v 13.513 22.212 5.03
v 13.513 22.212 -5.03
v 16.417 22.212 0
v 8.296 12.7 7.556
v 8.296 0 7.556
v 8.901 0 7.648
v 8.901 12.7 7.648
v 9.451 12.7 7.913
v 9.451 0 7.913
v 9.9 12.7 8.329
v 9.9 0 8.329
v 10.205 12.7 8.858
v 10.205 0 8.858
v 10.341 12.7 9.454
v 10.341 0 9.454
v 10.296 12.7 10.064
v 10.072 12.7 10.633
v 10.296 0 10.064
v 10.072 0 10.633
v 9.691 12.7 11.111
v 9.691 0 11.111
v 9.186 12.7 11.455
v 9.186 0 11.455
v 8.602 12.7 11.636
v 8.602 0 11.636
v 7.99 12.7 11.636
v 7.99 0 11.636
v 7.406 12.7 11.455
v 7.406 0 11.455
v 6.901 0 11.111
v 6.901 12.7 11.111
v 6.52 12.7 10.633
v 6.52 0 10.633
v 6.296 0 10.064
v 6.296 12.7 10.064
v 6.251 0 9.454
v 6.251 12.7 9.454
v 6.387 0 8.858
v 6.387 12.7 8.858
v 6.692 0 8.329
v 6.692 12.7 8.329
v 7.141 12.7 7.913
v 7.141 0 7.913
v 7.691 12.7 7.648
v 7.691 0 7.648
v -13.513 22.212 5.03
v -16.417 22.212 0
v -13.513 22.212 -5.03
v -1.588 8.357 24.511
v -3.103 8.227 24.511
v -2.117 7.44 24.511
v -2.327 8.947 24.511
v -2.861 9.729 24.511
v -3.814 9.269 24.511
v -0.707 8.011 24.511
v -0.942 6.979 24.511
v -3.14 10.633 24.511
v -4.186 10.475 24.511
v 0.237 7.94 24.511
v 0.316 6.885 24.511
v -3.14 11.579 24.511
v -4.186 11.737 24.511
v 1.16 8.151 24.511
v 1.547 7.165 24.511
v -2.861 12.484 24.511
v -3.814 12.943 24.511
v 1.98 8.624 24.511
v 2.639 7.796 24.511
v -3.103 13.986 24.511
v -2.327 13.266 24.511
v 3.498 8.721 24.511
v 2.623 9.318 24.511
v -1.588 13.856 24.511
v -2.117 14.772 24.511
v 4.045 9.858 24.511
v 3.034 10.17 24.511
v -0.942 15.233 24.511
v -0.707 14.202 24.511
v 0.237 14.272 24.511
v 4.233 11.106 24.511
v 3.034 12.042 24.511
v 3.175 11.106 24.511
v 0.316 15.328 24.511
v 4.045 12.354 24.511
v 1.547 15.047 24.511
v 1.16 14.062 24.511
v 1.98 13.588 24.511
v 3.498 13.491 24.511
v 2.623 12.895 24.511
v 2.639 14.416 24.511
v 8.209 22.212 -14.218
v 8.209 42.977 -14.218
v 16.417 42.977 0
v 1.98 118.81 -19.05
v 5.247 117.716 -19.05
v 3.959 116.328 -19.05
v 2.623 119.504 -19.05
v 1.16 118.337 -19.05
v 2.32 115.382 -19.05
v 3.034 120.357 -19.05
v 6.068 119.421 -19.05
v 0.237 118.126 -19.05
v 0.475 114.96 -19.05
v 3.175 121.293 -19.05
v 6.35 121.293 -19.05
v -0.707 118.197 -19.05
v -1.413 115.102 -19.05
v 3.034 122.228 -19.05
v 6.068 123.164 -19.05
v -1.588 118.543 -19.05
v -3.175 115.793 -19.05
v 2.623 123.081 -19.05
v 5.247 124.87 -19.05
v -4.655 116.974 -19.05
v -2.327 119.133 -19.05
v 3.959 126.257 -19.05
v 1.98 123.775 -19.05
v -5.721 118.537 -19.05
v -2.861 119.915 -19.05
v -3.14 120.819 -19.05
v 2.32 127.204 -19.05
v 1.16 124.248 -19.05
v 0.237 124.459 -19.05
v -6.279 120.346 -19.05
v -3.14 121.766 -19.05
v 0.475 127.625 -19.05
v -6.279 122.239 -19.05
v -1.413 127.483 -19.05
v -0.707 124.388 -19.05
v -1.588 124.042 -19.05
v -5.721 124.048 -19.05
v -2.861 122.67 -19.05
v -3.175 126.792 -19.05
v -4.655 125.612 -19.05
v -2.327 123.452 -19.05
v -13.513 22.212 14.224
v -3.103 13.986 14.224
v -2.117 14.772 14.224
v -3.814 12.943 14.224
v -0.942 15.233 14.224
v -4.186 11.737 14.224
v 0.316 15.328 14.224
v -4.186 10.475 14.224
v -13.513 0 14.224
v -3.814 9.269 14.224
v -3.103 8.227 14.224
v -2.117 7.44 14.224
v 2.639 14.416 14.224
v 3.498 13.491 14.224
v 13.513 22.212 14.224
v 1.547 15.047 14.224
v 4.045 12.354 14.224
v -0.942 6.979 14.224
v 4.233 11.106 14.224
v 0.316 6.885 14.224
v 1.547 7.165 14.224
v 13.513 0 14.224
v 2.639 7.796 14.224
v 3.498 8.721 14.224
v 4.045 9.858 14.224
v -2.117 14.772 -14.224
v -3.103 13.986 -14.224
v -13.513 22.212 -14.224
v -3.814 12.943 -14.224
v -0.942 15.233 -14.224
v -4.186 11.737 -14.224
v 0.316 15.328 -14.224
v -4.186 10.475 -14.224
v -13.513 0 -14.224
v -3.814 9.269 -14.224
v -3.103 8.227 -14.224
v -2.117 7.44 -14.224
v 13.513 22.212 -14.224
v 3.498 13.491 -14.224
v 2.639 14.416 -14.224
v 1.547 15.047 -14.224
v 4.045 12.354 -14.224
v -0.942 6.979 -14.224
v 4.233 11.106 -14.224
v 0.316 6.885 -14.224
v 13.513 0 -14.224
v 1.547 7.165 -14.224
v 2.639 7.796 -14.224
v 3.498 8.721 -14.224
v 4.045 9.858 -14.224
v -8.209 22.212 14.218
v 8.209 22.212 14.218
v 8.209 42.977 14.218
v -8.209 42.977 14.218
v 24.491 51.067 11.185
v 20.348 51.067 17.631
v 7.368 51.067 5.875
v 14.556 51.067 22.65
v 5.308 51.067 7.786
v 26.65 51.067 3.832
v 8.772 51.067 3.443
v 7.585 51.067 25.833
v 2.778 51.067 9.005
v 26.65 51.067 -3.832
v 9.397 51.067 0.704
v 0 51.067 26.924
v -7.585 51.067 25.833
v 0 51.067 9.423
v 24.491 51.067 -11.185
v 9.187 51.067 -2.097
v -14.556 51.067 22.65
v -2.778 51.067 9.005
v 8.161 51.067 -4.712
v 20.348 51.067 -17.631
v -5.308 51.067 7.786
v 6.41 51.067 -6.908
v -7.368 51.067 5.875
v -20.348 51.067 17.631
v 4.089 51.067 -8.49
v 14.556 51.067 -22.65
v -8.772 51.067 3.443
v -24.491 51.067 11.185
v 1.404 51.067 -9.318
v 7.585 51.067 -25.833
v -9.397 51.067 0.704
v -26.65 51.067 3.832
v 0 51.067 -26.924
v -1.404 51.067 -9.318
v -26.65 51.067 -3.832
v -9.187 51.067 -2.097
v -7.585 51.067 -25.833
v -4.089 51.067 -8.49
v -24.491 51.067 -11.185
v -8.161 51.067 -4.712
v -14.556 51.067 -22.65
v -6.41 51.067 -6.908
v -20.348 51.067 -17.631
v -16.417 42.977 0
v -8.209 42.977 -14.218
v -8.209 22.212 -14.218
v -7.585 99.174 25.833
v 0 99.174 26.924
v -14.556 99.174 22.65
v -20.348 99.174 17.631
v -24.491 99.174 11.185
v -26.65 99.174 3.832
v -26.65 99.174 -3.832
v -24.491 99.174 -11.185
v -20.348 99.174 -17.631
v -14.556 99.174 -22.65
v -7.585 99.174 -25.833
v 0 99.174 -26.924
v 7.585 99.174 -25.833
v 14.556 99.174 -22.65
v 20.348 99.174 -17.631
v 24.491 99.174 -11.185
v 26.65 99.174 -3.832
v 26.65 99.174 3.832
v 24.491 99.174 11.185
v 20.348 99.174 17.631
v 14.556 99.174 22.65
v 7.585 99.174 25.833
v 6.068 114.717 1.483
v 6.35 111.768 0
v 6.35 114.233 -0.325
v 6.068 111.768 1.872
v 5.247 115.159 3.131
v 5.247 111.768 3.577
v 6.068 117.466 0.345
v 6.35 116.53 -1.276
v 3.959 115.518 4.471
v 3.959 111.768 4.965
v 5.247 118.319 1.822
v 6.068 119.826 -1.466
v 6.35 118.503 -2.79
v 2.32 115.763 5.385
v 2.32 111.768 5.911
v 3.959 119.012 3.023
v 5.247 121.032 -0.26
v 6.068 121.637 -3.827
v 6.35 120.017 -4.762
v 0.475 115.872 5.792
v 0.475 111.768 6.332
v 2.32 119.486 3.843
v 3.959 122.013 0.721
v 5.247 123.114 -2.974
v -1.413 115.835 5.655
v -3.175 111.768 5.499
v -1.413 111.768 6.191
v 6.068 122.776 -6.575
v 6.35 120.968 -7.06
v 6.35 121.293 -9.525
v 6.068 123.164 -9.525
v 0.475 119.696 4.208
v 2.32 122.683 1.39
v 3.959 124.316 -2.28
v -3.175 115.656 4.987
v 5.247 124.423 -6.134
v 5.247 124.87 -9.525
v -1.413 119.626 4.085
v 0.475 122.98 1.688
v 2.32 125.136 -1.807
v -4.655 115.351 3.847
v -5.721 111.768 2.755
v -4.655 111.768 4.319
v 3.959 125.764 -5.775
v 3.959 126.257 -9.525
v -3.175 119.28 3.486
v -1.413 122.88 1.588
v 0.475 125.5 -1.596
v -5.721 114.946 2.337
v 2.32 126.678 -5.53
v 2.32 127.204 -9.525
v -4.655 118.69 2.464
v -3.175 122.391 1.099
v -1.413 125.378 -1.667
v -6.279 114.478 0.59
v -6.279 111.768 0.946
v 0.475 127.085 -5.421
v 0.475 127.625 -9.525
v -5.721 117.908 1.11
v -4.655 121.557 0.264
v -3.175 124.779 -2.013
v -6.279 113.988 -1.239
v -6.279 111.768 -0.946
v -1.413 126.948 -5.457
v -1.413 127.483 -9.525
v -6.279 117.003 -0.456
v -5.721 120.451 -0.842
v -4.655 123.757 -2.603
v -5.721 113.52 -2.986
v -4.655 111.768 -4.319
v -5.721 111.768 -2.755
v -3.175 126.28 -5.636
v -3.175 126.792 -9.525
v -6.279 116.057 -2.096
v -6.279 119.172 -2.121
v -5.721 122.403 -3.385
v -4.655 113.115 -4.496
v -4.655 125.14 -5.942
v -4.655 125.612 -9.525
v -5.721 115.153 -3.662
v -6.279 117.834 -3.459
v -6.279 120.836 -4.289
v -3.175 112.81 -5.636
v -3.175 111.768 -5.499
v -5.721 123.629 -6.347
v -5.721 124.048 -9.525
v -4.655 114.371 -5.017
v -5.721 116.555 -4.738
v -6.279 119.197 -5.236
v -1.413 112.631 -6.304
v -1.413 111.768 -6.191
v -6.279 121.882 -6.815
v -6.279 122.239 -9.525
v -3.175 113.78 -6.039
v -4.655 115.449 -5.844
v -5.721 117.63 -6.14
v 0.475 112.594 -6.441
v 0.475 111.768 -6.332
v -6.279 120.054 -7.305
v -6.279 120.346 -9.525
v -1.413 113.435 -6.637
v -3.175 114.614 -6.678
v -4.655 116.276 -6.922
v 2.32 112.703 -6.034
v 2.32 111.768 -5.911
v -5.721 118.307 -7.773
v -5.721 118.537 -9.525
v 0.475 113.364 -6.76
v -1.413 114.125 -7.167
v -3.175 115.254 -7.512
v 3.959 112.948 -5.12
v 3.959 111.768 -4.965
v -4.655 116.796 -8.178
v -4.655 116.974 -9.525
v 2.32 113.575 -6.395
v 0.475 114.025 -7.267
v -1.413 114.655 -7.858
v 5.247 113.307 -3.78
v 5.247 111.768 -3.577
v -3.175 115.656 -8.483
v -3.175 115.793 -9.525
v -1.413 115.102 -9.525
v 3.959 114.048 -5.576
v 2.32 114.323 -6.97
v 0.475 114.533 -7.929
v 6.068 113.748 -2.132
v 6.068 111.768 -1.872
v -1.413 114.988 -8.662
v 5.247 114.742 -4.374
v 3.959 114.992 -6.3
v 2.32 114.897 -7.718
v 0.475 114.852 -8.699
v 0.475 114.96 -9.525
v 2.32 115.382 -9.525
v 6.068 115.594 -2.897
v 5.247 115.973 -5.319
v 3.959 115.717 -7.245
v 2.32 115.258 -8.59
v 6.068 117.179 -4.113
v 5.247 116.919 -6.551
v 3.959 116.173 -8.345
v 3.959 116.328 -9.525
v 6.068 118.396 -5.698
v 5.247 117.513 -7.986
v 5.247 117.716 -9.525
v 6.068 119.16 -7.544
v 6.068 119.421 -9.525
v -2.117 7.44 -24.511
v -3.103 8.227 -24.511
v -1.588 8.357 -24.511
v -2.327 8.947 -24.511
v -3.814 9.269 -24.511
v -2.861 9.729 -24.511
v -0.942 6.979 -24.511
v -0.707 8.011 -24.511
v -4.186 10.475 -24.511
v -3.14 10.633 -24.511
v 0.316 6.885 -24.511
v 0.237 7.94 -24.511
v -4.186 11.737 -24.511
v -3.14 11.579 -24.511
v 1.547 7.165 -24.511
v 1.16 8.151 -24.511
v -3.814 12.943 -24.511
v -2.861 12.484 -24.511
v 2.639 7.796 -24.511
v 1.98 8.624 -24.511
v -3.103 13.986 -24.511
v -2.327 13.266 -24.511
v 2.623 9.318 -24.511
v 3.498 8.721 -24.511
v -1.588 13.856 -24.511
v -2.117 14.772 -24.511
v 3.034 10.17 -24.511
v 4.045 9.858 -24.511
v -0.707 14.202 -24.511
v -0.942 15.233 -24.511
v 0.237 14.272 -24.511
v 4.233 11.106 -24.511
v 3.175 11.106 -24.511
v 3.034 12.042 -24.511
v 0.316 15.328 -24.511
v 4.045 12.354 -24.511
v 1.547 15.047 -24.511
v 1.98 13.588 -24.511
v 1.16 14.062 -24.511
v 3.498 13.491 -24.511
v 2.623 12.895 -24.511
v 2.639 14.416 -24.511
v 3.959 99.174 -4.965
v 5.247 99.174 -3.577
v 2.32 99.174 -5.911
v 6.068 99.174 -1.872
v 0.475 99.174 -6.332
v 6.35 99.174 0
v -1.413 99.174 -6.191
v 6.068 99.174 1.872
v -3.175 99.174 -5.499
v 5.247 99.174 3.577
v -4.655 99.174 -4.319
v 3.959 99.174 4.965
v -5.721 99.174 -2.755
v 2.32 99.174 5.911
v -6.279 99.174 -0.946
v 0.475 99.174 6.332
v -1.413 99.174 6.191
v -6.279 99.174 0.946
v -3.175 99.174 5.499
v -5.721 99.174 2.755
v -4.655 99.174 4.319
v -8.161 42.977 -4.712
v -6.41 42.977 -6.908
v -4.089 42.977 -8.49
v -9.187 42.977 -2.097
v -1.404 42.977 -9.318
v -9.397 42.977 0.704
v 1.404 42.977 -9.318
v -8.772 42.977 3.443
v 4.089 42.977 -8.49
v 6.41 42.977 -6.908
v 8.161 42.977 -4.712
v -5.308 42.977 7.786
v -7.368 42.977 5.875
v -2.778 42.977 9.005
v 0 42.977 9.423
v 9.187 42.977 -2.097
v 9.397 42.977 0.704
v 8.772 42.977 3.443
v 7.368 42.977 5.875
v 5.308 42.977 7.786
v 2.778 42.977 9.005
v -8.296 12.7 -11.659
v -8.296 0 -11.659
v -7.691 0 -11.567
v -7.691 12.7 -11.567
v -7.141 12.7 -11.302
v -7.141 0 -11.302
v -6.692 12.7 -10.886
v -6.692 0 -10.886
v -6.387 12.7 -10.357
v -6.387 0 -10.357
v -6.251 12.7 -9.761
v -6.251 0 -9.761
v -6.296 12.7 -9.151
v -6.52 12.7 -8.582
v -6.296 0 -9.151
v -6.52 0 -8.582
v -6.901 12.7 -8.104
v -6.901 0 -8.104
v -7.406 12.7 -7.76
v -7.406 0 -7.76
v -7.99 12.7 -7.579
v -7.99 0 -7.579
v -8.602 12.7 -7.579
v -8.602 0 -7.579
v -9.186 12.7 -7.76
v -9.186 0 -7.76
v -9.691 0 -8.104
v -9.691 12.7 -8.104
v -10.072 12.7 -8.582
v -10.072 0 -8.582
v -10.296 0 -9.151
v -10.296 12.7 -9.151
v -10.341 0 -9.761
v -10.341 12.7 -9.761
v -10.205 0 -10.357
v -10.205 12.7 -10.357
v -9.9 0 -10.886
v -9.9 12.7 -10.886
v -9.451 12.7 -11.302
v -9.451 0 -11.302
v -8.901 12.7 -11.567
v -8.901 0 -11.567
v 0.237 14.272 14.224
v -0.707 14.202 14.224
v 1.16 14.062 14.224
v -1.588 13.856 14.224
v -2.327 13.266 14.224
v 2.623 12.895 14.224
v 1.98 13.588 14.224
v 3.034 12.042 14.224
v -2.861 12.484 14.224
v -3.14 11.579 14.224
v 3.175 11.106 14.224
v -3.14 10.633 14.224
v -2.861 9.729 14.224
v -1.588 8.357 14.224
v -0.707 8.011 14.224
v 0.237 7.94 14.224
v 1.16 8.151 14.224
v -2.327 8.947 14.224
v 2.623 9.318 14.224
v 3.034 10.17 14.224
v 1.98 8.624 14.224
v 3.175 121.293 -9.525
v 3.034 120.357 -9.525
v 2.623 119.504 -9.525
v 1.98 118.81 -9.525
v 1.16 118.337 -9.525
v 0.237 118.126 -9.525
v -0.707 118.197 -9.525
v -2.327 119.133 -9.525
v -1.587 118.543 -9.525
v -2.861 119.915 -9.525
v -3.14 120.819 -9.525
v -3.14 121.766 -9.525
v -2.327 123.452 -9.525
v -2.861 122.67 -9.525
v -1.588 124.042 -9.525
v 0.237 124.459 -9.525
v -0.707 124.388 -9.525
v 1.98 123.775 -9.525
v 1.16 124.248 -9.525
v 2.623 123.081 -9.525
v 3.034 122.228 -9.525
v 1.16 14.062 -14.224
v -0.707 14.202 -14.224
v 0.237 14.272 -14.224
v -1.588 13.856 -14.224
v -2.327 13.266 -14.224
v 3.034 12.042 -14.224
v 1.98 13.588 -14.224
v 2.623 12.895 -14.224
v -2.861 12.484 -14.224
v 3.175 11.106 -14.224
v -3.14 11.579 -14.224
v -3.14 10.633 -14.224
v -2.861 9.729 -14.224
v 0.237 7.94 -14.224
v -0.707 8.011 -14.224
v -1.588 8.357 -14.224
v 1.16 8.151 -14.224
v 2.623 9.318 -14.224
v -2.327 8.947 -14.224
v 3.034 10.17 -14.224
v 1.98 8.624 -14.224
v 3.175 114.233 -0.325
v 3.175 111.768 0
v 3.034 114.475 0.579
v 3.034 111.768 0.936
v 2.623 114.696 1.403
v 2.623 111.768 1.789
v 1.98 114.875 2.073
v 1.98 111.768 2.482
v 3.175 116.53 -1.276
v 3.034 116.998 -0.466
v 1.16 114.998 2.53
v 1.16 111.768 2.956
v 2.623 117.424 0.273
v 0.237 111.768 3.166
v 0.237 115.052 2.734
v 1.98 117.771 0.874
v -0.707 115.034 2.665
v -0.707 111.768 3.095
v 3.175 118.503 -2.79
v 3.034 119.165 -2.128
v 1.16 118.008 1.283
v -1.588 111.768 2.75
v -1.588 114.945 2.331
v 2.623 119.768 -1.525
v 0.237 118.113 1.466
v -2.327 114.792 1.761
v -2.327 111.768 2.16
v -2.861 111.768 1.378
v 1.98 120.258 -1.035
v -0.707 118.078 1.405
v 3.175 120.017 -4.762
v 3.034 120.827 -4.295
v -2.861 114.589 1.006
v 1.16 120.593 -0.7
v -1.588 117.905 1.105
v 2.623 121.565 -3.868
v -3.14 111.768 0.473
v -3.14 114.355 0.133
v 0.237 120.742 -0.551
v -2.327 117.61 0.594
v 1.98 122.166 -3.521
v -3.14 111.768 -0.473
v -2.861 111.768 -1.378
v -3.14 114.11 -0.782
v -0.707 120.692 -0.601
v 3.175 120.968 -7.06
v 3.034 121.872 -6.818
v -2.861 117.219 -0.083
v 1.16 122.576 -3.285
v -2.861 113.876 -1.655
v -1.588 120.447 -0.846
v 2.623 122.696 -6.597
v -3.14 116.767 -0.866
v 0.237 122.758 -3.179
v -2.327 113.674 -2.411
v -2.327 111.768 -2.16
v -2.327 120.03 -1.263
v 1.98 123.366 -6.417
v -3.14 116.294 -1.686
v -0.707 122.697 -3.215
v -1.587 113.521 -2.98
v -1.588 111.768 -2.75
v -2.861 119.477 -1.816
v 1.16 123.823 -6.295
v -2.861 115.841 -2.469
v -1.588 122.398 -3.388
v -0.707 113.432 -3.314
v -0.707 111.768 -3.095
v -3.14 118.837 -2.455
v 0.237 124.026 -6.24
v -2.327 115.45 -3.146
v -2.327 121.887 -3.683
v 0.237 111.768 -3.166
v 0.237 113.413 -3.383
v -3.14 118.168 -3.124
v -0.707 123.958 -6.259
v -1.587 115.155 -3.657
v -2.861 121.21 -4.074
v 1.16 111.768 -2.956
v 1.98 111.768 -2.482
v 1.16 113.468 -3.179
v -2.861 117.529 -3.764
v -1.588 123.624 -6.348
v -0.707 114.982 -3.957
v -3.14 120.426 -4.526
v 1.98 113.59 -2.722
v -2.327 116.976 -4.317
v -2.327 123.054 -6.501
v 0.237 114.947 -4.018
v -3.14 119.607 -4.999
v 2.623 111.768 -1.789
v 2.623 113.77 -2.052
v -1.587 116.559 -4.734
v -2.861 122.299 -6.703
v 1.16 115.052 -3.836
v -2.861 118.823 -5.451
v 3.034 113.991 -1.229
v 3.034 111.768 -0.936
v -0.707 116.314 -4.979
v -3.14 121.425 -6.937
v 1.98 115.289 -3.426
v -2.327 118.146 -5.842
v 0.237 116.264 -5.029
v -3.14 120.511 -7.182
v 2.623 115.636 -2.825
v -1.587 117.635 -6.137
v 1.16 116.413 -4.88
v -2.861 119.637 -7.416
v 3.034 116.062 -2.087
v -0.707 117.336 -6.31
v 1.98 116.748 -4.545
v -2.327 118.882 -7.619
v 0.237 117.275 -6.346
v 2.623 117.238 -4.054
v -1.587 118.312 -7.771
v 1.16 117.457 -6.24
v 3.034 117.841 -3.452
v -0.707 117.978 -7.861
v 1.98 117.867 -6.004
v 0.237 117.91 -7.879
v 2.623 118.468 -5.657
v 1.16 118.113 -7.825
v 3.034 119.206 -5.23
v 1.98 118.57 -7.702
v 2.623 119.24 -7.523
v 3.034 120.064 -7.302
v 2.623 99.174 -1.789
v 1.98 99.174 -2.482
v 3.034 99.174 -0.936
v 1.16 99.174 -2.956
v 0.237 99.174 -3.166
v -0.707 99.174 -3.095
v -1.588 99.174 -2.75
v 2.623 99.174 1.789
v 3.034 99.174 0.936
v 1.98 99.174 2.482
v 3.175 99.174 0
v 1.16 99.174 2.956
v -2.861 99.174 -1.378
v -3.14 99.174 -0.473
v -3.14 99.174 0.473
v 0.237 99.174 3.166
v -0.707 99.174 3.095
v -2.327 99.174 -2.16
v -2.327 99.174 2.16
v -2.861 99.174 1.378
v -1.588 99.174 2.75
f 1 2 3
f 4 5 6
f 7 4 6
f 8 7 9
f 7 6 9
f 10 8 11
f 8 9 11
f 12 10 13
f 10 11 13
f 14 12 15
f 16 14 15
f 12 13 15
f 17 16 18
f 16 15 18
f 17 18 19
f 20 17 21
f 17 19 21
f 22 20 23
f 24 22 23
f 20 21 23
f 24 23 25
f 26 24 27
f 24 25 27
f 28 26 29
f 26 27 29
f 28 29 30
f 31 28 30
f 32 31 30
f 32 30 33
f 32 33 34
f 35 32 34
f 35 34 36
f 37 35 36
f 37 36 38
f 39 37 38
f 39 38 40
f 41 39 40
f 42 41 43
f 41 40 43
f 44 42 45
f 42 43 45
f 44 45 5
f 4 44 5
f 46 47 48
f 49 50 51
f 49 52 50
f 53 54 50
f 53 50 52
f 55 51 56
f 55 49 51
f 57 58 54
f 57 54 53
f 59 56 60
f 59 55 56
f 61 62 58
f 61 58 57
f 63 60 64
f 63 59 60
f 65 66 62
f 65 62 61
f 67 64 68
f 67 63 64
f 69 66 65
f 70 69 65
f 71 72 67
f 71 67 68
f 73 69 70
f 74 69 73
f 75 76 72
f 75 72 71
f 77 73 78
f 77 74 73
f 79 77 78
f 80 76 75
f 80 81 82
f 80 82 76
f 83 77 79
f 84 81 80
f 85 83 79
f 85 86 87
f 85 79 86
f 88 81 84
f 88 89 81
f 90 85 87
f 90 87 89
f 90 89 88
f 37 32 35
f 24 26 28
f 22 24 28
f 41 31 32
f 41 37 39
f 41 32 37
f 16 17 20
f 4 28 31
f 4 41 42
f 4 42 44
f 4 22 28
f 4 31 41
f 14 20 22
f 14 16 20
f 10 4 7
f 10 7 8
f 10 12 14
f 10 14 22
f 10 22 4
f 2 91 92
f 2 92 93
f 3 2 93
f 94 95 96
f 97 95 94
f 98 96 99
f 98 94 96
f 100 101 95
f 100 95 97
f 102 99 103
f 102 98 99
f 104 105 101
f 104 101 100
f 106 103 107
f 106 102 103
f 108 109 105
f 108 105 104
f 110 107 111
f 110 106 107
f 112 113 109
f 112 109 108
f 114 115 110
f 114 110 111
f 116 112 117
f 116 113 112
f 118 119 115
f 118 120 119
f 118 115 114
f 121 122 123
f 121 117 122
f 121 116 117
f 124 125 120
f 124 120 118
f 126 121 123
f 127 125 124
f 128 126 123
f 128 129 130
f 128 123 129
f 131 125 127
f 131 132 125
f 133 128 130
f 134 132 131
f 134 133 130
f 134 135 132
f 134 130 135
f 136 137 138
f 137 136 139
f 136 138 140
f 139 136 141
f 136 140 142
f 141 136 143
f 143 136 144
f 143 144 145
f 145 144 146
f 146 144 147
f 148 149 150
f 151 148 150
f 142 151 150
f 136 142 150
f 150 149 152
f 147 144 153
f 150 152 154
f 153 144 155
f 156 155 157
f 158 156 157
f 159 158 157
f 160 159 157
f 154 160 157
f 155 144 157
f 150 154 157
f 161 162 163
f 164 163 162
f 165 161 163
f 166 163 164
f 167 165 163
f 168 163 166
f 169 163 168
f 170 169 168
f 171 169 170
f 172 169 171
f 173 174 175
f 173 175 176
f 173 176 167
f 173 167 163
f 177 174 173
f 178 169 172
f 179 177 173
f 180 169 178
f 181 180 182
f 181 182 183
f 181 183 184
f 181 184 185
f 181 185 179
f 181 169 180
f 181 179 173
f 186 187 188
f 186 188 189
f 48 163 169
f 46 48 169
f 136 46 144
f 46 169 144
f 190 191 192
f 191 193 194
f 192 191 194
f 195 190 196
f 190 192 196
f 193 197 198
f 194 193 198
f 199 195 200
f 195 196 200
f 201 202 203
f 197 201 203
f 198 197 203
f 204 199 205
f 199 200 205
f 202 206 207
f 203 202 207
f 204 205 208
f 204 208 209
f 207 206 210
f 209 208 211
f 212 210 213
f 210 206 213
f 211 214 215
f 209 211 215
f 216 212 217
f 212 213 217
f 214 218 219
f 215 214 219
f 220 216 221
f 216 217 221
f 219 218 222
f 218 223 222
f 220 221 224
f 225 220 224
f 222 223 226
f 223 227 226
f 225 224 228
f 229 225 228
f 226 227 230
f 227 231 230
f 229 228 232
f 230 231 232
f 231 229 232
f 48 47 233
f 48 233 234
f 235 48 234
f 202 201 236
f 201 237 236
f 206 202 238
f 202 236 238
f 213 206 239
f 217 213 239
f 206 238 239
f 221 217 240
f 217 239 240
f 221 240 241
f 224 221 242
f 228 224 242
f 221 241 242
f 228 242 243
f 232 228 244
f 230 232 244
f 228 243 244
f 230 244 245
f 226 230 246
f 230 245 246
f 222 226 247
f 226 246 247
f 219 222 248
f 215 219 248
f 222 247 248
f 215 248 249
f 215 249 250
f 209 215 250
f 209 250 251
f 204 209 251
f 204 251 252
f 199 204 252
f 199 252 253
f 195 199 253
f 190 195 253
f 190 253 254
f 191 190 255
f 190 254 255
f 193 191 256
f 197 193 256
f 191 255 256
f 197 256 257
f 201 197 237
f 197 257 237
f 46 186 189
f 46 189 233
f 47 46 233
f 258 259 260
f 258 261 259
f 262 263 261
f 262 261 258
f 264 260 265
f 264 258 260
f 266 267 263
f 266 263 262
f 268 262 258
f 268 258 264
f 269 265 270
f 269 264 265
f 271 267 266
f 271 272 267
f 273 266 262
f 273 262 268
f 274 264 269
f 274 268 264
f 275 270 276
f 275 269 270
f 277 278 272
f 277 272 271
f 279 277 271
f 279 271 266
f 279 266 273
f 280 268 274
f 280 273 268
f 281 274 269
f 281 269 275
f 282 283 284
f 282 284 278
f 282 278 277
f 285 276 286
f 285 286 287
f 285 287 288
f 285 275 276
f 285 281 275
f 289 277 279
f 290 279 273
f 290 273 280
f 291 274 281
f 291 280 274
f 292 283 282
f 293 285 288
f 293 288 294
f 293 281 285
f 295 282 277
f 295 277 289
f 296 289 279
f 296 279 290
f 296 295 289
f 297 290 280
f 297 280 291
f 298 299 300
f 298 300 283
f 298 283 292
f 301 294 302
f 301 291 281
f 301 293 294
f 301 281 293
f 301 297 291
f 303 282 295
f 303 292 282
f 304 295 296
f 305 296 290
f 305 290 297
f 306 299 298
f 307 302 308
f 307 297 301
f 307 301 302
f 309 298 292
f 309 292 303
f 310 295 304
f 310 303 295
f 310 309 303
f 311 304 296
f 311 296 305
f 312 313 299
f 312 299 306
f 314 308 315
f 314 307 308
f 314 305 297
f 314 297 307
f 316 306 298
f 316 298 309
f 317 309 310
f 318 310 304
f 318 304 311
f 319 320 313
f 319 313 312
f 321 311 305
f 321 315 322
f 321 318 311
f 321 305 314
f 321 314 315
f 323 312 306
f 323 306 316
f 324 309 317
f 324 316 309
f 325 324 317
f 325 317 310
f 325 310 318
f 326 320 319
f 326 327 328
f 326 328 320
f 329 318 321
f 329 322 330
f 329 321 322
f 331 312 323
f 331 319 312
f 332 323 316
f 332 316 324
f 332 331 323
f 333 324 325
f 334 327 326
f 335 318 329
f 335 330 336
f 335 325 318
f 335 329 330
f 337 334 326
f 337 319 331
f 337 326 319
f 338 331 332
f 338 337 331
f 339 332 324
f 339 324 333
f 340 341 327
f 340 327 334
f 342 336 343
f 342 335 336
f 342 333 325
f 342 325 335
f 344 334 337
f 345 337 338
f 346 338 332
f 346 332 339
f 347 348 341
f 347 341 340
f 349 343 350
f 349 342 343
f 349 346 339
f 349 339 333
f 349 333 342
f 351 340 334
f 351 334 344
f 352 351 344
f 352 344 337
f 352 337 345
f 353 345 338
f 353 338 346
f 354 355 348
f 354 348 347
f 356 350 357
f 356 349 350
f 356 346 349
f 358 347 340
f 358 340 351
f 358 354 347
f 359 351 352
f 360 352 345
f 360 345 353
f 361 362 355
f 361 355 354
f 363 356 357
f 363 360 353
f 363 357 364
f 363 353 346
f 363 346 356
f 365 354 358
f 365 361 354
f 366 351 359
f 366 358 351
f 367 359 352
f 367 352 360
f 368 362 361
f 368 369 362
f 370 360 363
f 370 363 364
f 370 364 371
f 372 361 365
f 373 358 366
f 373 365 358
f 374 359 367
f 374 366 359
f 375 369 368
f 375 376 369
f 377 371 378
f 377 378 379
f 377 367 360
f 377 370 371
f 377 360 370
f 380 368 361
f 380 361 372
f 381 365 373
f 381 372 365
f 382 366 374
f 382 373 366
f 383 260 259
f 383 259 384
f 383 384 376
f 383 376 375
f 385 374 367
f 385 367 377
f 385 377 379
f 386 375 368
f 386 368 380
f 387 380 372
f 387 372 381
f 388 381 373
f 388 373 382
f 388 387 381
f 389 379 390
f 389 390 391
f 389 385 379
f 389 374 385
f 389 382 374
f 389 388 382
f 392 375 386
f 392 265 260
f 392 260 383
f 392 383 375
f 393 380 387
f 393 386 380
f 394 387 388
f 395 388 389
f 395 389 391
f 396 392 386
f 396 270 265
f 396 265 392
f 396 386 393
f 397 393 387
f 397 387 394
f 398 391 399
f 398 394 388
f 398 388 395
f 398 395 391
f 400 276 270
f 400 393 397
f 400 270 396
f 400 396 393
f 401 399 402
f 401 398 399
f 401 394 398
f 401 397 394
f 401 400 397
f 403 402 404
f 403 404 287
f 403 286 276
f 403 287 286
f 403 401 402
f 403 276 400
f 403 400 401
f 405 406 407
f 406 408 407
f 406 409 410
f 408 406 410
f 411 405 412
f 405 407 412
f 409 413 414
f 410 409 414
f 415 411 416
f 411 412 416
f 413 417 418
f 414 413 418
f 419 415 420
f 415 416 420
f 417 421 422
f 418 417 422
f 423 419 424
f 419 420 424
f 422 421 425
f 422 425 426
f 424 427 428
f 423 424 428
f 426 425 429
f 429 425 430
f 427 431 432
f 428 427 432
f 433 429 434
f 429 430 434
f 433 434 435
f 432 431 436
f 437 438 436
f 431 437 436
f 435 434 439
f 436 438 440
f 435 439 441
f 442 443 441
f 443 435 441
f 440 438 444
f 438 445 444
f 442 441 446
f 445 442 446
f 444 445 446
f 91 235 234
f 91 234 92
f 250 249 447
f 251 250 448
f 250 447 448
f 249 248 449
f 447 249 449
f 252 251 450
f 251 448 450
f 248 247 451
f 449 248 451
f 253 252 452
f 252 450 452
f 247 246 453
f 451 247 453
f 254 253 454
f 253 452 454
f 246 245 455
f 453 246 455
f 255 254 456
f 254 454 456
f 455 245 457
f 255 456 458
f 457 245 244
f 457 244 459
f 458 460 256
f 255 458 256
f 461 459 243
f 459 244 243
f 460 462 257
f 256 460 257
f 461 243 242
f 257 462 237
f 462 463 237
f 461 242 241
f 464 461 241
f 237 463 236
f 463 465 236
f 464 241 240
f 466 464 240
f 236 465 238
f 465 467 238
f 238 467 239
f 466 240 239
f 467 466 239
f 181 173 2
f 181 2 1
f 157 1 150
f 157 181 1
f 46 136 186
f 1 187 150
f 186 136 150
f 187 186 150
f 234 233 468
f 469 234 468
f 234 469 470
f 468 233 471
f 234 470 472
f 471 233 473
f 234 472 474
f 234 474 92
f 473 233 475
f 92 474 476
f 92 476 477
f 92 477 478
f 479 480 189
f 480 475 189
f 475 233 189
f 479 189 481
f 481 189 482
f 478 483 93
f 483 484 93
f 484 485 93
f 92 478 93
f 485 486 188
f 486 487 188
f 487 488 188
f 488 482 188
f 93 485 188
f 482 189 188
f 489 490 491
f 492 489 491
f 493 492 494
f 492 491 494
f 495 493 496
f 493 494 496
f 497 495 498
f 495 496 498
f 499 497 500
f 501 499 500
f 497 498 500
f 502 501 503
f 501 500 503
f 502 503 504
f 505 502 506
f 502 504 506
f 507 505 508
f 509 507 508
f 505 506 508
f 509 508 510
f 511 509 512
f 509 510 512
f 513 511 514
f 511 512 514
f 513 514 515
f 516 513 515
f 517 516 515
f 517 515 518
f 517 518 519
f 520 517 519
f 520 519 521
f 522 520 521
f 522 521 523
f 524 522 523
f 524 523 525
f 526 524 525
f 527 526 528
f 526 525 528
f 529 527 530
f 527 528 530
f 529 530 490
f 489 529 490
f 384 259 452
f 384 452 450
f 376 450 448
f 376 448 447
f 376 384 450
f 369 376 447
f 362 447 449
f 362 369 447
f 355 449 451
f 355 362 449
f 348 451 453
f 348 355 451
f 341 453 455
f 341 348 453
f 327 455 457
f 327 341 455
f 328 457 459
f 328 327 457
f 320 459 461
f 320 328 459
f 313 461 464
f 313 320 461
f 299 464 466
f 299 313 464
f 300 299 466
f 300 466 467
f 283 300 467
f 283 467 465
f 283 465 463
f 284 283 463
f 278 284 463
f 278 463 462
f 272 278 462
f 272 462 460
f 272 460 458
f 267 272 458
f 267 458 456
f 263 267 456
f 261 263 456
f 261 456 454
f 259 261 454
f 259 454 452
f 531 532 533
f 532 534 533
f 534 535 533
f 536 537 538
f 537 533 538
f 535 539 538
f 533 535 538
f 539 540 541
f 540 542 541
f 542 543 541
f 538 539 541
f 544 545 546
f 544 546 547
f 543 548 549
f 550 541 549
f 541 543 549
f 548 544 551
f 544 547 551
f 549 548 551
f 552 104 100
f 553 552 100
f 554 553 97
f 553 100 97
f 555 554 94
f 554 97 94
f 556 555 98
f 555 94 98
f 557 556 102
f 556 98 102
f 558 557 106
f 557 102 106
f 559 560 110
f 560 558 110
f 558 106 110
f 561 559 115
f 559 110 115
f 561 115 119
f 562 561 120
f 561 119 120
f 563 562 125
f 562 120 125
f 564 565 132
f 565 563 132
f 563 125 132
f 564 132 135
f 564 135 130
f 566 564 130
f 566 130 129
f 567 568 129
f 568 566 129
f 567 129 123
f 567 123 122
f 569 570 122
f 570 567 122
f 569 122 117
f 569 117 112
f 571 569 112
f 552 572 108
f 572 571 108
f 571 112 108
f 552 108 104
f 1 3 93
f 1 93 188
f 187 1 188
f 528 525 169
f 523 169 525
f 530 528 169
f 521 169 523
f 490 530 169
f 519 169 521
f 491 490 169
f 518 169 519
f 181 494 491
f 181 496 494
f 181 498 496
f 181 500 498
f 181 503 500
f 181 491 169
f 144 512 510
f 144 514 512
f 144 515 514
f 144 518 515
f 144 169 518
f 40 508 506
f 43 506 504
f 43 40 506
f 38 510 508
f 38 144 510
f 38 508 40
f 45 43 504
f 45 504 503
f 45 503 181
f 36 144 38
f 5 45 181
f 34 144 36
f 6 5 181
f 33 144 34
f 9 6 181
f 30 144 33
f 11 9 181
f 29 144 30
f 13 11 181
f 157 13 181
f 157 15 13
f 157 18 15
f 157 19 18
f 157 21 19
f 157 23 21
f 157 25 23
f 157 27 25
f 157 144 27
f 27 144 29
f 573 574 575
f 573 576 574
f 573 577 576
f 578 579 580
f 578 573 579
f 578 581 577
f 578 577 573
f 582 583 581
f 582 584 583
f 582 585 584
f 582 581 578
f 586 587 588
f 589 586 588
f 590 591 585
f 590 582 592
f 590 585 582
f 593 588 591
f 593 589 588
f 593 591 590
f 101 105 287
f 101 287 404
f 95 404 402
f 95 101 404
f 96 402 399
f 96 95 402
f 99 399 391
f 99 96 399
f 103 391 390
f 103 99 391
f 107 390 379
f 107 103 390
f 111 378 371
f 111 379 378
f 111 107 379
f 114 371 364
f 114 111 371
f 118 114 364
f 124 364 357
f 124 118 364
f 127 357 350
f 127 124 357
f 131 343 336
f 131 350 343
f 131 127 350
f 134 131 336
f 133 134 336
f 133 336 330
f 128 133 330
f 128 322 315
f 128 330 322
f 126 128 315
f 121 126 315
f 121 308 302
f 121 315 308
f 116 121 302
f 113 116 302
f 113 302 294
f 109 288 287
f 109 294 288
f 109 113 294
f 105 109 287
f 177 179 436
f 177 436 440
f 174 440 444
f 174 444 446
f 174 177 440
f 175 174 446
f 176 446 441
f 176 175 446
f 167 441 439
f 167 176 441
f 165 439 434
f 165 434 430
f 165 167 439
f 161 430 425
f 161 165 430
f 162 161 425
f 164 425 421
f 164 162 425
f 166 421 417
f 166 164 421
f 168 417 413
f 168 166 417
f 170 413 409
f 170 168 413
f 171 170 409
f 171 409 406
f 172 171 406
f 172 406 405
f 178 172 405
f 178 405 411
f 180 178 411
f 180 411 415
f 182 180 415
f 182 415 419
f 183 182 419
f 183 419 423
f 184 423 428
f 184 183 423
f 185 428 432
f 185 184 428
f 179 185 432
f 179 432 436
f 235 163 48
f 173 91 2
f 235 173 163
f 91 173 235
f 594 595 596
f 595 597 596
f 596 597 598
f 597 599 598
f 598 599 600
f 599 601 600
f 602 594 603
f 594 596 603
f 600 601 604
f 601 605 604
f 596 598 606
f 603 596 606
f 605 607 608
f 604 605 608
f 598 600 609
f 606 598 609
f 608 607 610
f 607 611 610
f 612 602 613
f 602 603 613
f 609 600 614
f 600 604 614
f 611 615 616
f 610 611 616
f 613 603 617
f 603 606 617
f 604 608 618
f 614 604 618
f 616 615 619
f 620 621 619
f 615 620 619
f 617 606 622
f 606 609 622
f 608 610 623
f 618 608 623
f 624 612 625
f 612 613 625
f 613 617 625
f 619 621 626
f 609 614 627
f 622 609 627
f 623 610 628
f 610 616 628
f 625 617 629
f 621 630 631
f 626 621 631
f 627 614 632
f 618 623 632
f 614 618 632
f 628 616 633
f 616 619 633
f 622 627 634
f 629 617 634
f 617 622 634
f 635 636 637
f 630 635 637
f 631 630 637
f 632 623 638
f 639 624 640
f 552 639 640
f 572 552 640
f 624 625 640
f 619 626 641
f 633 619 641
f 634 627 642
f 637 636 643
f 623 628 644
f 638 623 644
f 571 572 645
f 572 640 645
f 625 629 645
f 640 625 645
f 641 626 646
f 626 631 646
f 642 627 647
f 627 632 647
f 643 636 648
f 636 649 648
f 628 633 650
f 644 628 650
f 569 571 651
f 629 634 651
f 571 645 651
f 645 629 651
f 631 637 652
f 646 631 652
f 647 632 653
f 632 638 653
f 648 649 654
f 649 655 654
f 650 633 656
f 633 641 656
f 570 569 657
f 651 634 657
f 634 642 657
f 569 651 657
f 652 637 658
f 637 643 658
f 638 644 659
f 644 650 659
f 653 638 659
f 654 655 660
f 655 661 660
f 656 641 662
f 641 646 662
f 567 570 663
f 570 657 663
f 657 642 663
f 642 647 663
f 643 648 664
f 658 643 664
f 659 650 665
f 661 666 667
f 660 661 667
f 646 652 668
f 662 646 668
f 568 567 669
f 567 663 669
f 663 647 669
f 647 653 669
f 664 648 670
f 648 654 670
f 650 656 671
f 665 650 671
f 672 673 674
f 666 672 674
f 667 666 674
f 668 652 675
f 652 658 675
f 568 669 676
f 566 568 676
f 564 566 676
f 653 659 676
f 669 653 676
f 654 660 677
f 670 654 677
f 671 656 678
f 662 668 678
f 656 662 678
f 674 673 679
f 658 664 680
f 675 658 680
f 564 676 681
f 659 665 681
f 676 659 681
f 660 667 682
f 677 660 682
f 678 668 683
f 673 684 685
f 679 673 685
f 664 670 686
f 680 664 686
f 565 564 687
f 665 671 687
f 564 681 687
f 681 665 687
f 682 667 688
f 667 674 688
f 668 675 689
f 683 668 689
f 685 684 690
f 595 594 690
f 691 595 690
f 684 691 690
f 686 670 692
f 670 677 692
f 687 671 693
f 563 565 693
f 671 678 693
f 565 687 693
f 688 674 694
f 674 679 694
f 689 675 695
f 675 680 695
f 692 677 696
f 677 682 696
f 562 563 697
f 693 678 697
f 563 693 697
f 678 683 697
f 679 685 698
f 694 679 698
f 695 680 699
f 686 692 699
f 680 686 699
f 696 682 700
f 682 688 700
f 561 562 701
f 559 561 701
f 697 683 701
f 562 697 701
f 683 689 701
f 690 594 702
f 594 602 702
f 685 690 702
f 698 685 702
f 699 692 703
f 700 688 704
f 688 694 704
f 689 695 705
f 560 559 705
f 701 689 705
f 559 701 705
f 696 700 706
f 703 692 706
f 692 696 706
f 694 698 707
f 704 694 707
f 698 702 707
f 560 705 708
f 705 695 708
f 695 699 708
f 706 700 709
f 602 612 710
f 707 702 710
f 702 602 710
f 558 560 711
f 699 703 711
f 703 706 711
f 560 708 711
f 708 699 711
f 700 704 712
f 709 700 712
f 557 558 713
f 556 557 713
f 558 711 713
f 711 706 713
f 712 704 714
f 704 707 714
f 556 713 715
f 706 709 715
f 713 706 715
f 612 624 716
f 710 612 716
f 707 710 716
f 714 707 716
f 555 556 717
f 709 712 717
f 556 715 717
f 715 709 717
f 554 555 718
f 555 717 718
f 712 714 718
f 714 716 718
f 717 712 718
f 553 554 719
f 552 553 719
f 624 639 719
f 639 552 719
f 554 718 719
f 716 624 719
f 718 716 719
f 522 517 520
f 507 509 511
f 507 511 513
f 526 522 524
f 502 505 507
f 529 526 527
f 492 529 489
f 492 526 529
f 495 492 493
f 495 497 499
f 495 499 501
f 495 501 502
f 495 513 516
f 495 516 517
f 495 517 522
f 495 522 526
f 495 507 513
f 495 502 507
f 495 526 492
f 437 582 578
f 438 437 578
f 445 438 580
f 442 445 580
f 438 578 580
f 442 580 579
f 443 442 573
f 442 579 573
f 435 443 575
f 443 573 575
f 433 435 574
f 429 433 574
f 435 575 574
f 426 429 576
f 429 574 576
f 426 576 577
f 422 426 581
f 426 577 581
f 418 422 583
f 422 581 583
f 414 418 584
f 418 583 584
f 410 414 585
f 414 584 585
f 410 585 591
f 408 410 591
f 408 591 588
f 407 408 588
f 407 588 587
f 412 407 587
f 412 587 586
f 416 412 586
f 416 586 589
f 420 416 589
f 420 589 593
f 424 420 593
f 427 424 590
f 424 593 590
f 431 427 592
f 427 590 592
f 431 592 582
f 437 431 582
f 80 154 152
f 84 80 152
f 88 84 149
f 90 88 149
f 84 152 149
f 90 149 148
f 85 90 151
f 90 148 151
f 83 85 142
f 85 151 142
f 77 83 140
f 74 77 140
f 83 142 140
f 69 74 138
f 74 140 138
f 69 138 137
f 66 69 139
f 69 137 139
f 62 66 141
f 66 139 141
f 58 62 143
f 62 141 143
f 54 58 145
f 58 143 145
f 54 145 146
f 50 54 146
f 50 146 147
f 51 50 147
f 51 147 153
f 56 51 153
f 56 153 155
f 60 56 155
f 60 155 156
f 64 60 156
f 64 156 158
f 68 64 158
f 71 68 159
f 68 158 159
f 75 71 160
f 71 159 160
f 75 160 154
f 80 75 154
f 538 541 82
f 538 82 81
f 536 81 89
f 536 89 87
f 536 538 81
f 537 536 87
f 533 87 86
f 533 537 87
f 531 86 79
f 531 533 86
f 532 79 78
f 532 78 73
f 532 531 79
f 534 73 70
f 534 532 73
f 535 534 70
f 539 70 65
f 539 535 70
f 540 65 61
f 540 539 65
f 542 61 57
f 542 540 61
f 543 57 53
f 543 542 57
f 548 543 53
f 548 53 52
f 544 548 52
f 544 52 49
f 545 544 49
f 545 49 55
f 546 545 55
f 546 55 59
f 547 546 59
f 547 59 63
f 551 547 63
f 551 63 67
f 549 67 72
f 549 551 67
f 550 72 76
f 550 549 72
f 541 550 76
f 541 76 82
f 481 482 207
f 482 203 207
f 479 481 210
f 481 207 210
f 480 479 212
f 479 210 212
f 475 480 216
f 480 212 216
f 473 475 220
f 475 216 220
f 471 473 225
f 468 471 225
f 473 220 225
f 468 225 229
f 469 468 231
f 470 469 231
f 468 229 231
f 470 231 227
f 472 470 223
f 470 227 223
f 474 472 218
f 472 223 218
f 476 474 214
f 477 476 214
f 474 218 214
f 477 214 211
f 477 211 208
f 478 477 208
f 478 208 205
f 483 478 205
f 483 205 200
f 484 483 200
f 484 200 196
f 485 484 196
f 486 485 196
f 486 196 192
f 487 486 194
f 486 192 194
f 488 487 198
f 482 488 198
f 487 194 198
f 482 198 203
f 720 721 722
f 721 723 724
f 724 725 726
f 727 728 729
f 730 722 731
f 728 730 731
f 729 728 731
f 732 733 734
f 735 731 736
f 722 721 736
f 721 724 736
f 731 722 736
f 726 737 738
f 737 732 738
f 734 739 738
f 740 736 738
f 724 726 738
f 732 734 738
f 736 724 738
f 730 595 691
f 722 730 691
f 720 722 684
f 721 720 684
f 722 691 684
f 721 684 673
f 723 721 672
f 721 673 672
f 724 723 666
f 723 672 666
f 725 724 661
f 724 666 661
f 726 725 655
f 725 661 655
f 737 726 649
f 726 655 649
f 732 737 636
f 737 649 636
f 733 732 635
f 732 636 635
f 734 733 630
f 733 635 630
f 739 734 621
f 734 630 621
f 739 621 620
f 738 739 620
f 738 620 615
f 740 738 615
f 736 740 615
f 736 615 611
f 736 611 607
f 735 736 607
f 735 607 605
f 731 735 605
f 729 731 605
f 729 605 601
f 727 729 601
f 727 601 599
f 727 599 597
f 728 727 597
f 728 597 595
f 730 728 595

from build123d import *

# Parameters (mm, degrees)
SKETCH2_W         = 27.0256
SKETCH2_H         = 28.448
MOUNT_BLOCK_DEPTH = 22.2123
MID_HEX_DEPTH     = 20.7645
SKETCH4_R         = 4.233333333
SKETCH4_R_2       = 3.175
SWGLK_M_DEPTH     = 10.287
SKETCH6_R         = 6.35
SKETCH6_R_2       = 3.175
SKETCH7_R         = 2.05105
MOUNT_HOLES_DEPTH = 12.7


with BuildPart() as part:
    # Sketch1 → BASE (revolve)
    with BuildSketch(Plane(origin=(0, 0, 0), x_dir=(0, 0, -1), z_dir=(1, 0, 0)), mode=Mode.PRIVATE) as base_sk:
        Polygon((0, 0), (12.7, 0), (12.7, 22.2123), (14.21765, 22.2123), (14.21765, 42.9768), (9.4234, 42.9768), (9.4234, 51.0667), (26.924, 51.0667), (26.924, 99.1743), (0, 99.1743), align=None)
    revolve(base_sk.sketch.rotate(Axis((0, 0, 0), (0, -1, 0)), 180), axis=Axis((0, 0, 0), (0, -1, 0)))

    # Sketch2 → MOUNT_BLOCK (add)
    with BuildSketch(Plane.XZ):
        Rectangle(SKETCH2_W, SKETCH2_H)
    extrude(amount=-MOUNT_BLOCK_DEPTH)

    # Sketch3 → MID_HEX (add)
    with BuildSketch(Plane.XZ.offset(-22.2123)):
        Polygon((16.417128109, 0), (8.208564055, 14.21765), (-8.208564055, 14.21765), (-16.417128109, 0), (-8.208564055, -14.21765), (8.208564055, -14.21765), align=None)
    extrude(amount=-MID_HEX_DEPTH)

    # Sketch4 → SWGLK_M (add)
    with BuildSketch(Plane.XY.offset(14.224)):
        with Locations((0, 11.10615)):
            Circle(SKETCH4_R)
        with Locations((0, 11.10615)):
            Circle(SKETCH4_R_2, mode=Mode.SUBTRACT)
    swglk_m = extrude(amount=SWGLK_M_DEPTH)

    # SWGLK_M_MRR: SWGLK_M across plane
    add(swglk_m.mirror(Plane.XY))

    # PRESS_QD: sweep along a path in Sketch5
    with BuildLine(Plane(origin=(0, 0, 0), x_dir=(0, 0, -1), z_dir=(1, 0, 0))) as press_qd_path:
        Line((0, 99.1743), (0, 111.76762))
        ThreePointArc((0, 111.76762), (2.789807909, 118.502812091), (9.525, 121.29262))
        Line((9.525, 121.29262), (19.05, 121.29262))
    # Sketch6 → PRESS_QD (sweep)
    with BuildSketch(Plane(origin=(0, 99.1743, 0), x_dir=(1, 0, 0), z_dir=(0, 1, 0))):
        Circle(SKETCH6_R)
        Circle(SKETCH6_R_2, mode=Mode.SUBTRACT)
    sweep(path=press_qd_path.line)

    # Sketch7 → MOUNT_HOLES (cut)
    with BuildSketch(Plane.XZ):
        with Locations(Location((-8.296007071, -9.60755, 0), (0, 0, 270))):
            Circle(SKETCH7_R)
        with Locations(Location((8.296007071, 9.60755, 0), (0, 0, 270))):
            Circle(SKETCH7_R)
    extrude(amount=-MOUNT_HOLES_DEPTH, mode=Mode.SUBTRACT)


solid = part.part
